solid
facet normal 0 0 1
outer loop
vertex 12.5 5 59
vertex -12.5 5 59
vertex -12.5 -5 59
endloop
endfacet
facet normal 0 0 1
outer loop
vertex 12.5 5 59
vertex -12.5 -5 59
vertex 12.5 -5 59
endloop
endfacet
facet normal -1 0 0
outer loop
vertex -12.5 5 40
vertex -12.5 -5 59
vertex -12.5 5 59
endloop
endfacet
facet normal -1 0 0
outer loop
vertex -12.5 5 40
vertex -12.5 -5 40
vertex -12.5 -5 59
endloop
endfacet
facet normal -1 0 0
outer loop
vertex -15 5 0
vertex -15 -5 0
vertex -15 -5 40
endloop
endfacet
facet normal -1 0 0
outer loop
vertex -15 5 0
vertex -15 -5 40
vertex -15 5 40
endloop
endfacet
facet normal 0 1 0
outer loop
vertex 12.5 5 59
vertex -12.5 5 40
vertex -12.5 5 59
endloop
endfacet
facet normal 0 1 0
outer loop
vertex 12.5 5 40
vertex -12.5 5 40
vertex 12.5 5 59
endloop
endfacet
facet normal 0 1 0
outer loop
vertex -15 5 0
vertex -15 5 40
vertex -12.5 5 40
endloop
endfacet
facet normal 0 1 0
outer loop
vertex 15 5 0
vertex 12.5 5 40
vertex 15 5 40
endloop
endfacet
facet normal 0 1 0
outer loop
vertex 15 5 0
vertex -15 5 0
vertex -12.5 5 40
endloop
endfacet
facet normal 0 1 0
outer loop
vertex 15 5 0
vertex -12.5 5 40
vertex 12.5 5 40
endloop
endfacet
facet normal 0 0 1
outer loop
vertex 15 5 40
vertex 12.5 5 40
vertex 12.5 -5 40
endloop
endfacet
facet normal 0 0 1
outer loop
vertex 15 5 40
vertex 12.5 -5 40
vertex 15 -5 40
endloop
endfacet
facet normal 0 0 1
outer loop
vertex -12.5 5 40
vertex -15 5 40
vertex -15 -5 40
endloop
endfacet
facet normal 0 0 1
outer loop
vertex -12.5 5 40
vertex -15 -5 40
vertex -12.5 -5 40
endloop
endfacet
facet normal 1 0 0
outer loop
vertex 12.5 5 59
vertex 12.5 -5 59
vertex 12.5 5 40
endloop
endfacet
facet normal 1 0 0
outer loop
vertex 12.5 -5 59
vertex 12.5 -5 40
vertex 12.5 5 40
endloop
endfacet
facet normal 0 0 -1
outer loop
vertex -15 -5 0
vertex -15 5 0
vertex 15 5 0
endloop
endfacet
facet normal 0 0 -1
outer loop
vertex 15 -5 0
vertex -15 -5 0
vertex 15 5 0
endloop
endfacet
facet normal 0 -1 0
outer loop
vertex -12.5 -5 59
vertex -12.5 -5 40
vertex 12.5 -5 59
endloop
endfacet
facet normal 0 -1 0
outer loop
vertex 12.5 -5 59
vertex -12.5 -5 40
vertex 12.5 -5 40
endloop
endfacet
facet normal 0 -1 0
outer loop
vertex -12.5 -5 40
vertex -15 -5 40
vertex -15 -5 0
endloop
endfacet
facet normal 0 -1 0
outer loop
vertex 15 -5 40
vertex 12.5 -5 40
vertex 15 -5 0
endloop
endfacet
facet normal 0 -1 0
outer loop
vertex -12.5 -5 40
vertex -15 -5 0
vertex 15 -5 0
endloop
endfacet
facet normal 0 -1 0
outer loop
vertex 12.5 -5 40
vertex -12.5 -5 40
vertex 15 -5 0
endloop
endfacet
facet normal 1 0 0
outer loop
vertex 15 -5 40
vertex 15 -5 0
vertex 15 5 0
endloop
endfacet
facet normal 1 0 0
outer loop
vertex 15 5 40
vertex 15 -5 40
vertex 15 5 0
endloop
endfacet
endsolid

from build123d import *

# Parameters (mm, degrees)
F0_W     = 30
F0_H     = 10
F1_DEPTH = 40
F2_W     = 25
F2_H     = 10
F3_DEPTH = 12
F4_W     = 25
F4_H     = 10
F5_DEPTH = 7


with BuildPart() as f1:
    # F0 (on Top) → F1 (new body)
    with BuildSketch(Plane.XY):
        Rectangle(F0_W, F0_H)
    extrude(amount=F1_DEPTH)

    # F2 (on face) → F3 (join)
    with BuildSketch(Plane.XY.offset(40)):
        Rectangle(F2_W, F2_H)
    extrude(amount=F3_DEPTH)

    # F4 (on face) → F5 (join)
    with BuildSketch(Plane.XY.offset(52)):
        Rectangle(F4_W, F4_H)
    extrude(amount=F5_DEPTH)


solid = f1.part
